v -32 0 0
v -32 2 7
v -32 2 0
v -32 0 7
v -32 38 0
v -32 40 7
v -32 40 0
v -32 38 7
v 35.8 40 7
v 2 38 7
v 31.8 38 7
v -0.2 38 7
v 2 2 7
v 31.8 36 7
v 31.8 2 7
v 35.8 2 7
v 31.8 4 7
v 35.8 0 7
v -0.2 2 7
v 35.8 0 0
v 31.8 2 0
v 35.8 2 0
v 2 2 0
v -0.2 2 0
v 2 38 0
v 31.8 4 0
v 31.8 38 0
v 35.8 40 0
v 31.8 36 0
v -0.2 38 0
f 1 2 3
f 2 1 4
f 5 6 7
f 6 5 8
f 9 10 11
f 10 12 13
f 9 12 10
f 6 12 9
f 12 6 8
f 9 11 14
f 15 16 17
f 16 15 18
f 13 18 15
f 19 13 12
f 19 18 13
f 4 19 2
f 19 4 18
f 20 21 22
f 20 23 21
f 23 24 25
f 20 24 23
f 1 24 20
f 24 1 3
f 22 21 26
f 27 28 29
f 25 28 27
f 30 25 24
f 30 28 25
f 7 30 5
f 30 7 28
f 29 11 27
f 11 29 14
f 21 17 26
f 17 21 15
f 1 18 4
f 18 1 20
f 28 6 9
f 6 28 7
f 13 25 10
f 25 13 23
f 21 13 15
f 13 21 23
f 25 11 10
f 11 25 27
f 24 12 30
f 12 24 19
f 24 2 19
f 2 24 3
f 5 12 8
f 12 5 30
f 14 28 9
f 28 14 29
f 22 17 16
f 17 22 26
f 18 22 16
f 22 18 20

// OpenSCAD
// ============================================================
// PRINT PROFILE (see PRINTER.md for full slicer profile values)
// ------------------------------------------------------------
// Material:    PETG Basic — the insertion levers and hook tines flex during
//               tool-free insert/removal (that's their whole purpose) and
//               take real mechanical engagement force; PETG's toughness
//               tolerates repeated flex better than PLA's brittleness.
// Nozzle:      0.4mm — HOOK_PROTUBERANCE defaults to 2.0mm, resolvable fine
//               at 0.4mm; the smallest available option (2.0mm) is still
//               well above where a finer nozzle would be needed.
// Quality:     0.20mm Standard.
// Infill:      30% — hooks/levers/tines take real mechanical engagement
//               force repeatedly, similar reasoning to
//               customizable_U_hook_updated.scad.
// Orientation: the main C-shape body is extruded along Z by SPACER_WIDTH
//               (default 7mm) via a scale()+cube() — printing it flat, as
//               modeled, is almost certainly right for that thin flat
//               bracket shape. BUT the hook tines use a nested
//               scale()+linear_extrude() trick (see ~line 43) that's genuinely
//               hard to reason about from the code alone — don't trust this
//               description of tine orientation blindly; render a preview
//               and visually confirm which way the tines actually point
//               before printing, rather than assuming.
// Overrides:   none identified; flagging the orientation uncertainty above
//               instead of asserting confidence the code reading doesn't
//               actually back up.
// ============================================================

// : mm of extra z clearance you wish to add. usually around your glass thickness. note: 1/8" = 3.175mm, 3/8" = 9.525mm, 5/8" = 15.625mm, 3/4" = 19.05mm
ADJUST_HEIGHT = 2; // [0.8, 1, 1.5, 2, 2.5, 3, 3.175, 3.5, 4, 4.5, 5, 5.6, 6, 9.525, 15.625, 19.05]
// : a 1/10 mm fine tuning of the adjust_height. For example choosing 1.5 above and -0.2 here results in height = 1.5-0.2 = 1.3mm.
FINE_TUNE_HEIGHT = 0.0; // [-0.5, -0.4, -0.3, -0.2, -0.1, 0.0, 0.1, 0.2, 0.3, 0.4, 0.5]
// : how wide you want the spacer to be. 7mm is just right for fully covering the exposed side.
SPACER_WIDTH = 7; // [5,6,7]
// : how much you would like the tines of the hook to stick out. 
HOOK_PROTUBERANCE = 2.0; // [2.0, 3.0, 4.0]
// : add insertion levers on the back allowing you to insert and remove from the machine without disassembly. 1=Levers 0=No Levers
INSERTION_LEVERS = 1; // [0,1]

module zadjust() {

    HOOK_LENGTH = HOOK_PROTUBERANCE;
    ID_HEIGHT = 36;
    ID_WIDTH = 29.8;
    BASE_WIDTH = 2;
    LEVER_LENGTH = 32;
    EXTRA_HEIGHT = ADJUST_HEIGHT+FINE_TUNE_HEIGHT;
    
    translate([ID_WIDTH+HOOK_LENGTH, ID_HEIGHT+BASE_WIDTH+EXTRA_HEIGHT])
rotate([0,0,180]){
    // C shape
    difference() {
        // positive
        xsize = INSERTION_LEVERS ? ID_WIDTH+BASE_WIDTH+LEVER_LENGTH : ID_WIDTH+BASE_WIDTH;
        scale([xsize, ID_HEIGHT+BASE_WIDTH+EXTRA_HEIGHT, SPACER_WIDTH])
            cube();
        
        // negative
        translate([-0.01, BASE_WIDTH, -0.01])
            scale([ID_WIDTH+0.01,ID_HEIGHT,SPACER_WIDTH+0.02])
                cube();
        
        // insertion levers
        if(INSERTION_LEVERS)
            translate([LEVER_LENGTH, BASE_WIDTH, -0.01])
                scale([LEVER_LENGTH+BASE_WIDTH+0.01,ID_HEIGHT,SPACER_WIDTH+0.02])
                    cube();
    }
    
    // top hook
    translate([-BASE_WIDTH*HOOK_LENGTH,0,0])
        scale([BASE_WIDTH*HOOK_LENGTH, BASE_WIDTH+HOOK_PROTUBERANCE, SPACER_WIDTH])
            linear_extrude(1)
                polygon(points=[[1,1],[1,0],[0,0]]);
    
    // bottom hook
    translate([-BASE_WIDTH*HOOK_LENGTH,ID_HEIGHT+BASE_WIDTH+EXTRA_HEIGHT-(HOOK_PROTUBERANCE+EXTRA_HEIGHT),0])
        scale([BASE_WIDTH*HOOK_LENGTH, HOOK_PROTUBERANCE, SPACER_WIDTH])
            linear_extrude(1)
                translate([0,1,0])
                rotate([180,0,0])
                polygon(points=[[1,1],[1,0],[0,0]]);
    
    // bottom fill
    translate([-BASE_WIDTH*HOOK_LENGTH,ID_HEIGHT+BASE_WIDTH,0])
    scale([BASE_WIDTH*HOOK_LENGTH,EXTRA_HEIGHT,SPACER_WIDTH])
    cube();
}
}
color([0.4,0.7,0.8])
zadjust();
